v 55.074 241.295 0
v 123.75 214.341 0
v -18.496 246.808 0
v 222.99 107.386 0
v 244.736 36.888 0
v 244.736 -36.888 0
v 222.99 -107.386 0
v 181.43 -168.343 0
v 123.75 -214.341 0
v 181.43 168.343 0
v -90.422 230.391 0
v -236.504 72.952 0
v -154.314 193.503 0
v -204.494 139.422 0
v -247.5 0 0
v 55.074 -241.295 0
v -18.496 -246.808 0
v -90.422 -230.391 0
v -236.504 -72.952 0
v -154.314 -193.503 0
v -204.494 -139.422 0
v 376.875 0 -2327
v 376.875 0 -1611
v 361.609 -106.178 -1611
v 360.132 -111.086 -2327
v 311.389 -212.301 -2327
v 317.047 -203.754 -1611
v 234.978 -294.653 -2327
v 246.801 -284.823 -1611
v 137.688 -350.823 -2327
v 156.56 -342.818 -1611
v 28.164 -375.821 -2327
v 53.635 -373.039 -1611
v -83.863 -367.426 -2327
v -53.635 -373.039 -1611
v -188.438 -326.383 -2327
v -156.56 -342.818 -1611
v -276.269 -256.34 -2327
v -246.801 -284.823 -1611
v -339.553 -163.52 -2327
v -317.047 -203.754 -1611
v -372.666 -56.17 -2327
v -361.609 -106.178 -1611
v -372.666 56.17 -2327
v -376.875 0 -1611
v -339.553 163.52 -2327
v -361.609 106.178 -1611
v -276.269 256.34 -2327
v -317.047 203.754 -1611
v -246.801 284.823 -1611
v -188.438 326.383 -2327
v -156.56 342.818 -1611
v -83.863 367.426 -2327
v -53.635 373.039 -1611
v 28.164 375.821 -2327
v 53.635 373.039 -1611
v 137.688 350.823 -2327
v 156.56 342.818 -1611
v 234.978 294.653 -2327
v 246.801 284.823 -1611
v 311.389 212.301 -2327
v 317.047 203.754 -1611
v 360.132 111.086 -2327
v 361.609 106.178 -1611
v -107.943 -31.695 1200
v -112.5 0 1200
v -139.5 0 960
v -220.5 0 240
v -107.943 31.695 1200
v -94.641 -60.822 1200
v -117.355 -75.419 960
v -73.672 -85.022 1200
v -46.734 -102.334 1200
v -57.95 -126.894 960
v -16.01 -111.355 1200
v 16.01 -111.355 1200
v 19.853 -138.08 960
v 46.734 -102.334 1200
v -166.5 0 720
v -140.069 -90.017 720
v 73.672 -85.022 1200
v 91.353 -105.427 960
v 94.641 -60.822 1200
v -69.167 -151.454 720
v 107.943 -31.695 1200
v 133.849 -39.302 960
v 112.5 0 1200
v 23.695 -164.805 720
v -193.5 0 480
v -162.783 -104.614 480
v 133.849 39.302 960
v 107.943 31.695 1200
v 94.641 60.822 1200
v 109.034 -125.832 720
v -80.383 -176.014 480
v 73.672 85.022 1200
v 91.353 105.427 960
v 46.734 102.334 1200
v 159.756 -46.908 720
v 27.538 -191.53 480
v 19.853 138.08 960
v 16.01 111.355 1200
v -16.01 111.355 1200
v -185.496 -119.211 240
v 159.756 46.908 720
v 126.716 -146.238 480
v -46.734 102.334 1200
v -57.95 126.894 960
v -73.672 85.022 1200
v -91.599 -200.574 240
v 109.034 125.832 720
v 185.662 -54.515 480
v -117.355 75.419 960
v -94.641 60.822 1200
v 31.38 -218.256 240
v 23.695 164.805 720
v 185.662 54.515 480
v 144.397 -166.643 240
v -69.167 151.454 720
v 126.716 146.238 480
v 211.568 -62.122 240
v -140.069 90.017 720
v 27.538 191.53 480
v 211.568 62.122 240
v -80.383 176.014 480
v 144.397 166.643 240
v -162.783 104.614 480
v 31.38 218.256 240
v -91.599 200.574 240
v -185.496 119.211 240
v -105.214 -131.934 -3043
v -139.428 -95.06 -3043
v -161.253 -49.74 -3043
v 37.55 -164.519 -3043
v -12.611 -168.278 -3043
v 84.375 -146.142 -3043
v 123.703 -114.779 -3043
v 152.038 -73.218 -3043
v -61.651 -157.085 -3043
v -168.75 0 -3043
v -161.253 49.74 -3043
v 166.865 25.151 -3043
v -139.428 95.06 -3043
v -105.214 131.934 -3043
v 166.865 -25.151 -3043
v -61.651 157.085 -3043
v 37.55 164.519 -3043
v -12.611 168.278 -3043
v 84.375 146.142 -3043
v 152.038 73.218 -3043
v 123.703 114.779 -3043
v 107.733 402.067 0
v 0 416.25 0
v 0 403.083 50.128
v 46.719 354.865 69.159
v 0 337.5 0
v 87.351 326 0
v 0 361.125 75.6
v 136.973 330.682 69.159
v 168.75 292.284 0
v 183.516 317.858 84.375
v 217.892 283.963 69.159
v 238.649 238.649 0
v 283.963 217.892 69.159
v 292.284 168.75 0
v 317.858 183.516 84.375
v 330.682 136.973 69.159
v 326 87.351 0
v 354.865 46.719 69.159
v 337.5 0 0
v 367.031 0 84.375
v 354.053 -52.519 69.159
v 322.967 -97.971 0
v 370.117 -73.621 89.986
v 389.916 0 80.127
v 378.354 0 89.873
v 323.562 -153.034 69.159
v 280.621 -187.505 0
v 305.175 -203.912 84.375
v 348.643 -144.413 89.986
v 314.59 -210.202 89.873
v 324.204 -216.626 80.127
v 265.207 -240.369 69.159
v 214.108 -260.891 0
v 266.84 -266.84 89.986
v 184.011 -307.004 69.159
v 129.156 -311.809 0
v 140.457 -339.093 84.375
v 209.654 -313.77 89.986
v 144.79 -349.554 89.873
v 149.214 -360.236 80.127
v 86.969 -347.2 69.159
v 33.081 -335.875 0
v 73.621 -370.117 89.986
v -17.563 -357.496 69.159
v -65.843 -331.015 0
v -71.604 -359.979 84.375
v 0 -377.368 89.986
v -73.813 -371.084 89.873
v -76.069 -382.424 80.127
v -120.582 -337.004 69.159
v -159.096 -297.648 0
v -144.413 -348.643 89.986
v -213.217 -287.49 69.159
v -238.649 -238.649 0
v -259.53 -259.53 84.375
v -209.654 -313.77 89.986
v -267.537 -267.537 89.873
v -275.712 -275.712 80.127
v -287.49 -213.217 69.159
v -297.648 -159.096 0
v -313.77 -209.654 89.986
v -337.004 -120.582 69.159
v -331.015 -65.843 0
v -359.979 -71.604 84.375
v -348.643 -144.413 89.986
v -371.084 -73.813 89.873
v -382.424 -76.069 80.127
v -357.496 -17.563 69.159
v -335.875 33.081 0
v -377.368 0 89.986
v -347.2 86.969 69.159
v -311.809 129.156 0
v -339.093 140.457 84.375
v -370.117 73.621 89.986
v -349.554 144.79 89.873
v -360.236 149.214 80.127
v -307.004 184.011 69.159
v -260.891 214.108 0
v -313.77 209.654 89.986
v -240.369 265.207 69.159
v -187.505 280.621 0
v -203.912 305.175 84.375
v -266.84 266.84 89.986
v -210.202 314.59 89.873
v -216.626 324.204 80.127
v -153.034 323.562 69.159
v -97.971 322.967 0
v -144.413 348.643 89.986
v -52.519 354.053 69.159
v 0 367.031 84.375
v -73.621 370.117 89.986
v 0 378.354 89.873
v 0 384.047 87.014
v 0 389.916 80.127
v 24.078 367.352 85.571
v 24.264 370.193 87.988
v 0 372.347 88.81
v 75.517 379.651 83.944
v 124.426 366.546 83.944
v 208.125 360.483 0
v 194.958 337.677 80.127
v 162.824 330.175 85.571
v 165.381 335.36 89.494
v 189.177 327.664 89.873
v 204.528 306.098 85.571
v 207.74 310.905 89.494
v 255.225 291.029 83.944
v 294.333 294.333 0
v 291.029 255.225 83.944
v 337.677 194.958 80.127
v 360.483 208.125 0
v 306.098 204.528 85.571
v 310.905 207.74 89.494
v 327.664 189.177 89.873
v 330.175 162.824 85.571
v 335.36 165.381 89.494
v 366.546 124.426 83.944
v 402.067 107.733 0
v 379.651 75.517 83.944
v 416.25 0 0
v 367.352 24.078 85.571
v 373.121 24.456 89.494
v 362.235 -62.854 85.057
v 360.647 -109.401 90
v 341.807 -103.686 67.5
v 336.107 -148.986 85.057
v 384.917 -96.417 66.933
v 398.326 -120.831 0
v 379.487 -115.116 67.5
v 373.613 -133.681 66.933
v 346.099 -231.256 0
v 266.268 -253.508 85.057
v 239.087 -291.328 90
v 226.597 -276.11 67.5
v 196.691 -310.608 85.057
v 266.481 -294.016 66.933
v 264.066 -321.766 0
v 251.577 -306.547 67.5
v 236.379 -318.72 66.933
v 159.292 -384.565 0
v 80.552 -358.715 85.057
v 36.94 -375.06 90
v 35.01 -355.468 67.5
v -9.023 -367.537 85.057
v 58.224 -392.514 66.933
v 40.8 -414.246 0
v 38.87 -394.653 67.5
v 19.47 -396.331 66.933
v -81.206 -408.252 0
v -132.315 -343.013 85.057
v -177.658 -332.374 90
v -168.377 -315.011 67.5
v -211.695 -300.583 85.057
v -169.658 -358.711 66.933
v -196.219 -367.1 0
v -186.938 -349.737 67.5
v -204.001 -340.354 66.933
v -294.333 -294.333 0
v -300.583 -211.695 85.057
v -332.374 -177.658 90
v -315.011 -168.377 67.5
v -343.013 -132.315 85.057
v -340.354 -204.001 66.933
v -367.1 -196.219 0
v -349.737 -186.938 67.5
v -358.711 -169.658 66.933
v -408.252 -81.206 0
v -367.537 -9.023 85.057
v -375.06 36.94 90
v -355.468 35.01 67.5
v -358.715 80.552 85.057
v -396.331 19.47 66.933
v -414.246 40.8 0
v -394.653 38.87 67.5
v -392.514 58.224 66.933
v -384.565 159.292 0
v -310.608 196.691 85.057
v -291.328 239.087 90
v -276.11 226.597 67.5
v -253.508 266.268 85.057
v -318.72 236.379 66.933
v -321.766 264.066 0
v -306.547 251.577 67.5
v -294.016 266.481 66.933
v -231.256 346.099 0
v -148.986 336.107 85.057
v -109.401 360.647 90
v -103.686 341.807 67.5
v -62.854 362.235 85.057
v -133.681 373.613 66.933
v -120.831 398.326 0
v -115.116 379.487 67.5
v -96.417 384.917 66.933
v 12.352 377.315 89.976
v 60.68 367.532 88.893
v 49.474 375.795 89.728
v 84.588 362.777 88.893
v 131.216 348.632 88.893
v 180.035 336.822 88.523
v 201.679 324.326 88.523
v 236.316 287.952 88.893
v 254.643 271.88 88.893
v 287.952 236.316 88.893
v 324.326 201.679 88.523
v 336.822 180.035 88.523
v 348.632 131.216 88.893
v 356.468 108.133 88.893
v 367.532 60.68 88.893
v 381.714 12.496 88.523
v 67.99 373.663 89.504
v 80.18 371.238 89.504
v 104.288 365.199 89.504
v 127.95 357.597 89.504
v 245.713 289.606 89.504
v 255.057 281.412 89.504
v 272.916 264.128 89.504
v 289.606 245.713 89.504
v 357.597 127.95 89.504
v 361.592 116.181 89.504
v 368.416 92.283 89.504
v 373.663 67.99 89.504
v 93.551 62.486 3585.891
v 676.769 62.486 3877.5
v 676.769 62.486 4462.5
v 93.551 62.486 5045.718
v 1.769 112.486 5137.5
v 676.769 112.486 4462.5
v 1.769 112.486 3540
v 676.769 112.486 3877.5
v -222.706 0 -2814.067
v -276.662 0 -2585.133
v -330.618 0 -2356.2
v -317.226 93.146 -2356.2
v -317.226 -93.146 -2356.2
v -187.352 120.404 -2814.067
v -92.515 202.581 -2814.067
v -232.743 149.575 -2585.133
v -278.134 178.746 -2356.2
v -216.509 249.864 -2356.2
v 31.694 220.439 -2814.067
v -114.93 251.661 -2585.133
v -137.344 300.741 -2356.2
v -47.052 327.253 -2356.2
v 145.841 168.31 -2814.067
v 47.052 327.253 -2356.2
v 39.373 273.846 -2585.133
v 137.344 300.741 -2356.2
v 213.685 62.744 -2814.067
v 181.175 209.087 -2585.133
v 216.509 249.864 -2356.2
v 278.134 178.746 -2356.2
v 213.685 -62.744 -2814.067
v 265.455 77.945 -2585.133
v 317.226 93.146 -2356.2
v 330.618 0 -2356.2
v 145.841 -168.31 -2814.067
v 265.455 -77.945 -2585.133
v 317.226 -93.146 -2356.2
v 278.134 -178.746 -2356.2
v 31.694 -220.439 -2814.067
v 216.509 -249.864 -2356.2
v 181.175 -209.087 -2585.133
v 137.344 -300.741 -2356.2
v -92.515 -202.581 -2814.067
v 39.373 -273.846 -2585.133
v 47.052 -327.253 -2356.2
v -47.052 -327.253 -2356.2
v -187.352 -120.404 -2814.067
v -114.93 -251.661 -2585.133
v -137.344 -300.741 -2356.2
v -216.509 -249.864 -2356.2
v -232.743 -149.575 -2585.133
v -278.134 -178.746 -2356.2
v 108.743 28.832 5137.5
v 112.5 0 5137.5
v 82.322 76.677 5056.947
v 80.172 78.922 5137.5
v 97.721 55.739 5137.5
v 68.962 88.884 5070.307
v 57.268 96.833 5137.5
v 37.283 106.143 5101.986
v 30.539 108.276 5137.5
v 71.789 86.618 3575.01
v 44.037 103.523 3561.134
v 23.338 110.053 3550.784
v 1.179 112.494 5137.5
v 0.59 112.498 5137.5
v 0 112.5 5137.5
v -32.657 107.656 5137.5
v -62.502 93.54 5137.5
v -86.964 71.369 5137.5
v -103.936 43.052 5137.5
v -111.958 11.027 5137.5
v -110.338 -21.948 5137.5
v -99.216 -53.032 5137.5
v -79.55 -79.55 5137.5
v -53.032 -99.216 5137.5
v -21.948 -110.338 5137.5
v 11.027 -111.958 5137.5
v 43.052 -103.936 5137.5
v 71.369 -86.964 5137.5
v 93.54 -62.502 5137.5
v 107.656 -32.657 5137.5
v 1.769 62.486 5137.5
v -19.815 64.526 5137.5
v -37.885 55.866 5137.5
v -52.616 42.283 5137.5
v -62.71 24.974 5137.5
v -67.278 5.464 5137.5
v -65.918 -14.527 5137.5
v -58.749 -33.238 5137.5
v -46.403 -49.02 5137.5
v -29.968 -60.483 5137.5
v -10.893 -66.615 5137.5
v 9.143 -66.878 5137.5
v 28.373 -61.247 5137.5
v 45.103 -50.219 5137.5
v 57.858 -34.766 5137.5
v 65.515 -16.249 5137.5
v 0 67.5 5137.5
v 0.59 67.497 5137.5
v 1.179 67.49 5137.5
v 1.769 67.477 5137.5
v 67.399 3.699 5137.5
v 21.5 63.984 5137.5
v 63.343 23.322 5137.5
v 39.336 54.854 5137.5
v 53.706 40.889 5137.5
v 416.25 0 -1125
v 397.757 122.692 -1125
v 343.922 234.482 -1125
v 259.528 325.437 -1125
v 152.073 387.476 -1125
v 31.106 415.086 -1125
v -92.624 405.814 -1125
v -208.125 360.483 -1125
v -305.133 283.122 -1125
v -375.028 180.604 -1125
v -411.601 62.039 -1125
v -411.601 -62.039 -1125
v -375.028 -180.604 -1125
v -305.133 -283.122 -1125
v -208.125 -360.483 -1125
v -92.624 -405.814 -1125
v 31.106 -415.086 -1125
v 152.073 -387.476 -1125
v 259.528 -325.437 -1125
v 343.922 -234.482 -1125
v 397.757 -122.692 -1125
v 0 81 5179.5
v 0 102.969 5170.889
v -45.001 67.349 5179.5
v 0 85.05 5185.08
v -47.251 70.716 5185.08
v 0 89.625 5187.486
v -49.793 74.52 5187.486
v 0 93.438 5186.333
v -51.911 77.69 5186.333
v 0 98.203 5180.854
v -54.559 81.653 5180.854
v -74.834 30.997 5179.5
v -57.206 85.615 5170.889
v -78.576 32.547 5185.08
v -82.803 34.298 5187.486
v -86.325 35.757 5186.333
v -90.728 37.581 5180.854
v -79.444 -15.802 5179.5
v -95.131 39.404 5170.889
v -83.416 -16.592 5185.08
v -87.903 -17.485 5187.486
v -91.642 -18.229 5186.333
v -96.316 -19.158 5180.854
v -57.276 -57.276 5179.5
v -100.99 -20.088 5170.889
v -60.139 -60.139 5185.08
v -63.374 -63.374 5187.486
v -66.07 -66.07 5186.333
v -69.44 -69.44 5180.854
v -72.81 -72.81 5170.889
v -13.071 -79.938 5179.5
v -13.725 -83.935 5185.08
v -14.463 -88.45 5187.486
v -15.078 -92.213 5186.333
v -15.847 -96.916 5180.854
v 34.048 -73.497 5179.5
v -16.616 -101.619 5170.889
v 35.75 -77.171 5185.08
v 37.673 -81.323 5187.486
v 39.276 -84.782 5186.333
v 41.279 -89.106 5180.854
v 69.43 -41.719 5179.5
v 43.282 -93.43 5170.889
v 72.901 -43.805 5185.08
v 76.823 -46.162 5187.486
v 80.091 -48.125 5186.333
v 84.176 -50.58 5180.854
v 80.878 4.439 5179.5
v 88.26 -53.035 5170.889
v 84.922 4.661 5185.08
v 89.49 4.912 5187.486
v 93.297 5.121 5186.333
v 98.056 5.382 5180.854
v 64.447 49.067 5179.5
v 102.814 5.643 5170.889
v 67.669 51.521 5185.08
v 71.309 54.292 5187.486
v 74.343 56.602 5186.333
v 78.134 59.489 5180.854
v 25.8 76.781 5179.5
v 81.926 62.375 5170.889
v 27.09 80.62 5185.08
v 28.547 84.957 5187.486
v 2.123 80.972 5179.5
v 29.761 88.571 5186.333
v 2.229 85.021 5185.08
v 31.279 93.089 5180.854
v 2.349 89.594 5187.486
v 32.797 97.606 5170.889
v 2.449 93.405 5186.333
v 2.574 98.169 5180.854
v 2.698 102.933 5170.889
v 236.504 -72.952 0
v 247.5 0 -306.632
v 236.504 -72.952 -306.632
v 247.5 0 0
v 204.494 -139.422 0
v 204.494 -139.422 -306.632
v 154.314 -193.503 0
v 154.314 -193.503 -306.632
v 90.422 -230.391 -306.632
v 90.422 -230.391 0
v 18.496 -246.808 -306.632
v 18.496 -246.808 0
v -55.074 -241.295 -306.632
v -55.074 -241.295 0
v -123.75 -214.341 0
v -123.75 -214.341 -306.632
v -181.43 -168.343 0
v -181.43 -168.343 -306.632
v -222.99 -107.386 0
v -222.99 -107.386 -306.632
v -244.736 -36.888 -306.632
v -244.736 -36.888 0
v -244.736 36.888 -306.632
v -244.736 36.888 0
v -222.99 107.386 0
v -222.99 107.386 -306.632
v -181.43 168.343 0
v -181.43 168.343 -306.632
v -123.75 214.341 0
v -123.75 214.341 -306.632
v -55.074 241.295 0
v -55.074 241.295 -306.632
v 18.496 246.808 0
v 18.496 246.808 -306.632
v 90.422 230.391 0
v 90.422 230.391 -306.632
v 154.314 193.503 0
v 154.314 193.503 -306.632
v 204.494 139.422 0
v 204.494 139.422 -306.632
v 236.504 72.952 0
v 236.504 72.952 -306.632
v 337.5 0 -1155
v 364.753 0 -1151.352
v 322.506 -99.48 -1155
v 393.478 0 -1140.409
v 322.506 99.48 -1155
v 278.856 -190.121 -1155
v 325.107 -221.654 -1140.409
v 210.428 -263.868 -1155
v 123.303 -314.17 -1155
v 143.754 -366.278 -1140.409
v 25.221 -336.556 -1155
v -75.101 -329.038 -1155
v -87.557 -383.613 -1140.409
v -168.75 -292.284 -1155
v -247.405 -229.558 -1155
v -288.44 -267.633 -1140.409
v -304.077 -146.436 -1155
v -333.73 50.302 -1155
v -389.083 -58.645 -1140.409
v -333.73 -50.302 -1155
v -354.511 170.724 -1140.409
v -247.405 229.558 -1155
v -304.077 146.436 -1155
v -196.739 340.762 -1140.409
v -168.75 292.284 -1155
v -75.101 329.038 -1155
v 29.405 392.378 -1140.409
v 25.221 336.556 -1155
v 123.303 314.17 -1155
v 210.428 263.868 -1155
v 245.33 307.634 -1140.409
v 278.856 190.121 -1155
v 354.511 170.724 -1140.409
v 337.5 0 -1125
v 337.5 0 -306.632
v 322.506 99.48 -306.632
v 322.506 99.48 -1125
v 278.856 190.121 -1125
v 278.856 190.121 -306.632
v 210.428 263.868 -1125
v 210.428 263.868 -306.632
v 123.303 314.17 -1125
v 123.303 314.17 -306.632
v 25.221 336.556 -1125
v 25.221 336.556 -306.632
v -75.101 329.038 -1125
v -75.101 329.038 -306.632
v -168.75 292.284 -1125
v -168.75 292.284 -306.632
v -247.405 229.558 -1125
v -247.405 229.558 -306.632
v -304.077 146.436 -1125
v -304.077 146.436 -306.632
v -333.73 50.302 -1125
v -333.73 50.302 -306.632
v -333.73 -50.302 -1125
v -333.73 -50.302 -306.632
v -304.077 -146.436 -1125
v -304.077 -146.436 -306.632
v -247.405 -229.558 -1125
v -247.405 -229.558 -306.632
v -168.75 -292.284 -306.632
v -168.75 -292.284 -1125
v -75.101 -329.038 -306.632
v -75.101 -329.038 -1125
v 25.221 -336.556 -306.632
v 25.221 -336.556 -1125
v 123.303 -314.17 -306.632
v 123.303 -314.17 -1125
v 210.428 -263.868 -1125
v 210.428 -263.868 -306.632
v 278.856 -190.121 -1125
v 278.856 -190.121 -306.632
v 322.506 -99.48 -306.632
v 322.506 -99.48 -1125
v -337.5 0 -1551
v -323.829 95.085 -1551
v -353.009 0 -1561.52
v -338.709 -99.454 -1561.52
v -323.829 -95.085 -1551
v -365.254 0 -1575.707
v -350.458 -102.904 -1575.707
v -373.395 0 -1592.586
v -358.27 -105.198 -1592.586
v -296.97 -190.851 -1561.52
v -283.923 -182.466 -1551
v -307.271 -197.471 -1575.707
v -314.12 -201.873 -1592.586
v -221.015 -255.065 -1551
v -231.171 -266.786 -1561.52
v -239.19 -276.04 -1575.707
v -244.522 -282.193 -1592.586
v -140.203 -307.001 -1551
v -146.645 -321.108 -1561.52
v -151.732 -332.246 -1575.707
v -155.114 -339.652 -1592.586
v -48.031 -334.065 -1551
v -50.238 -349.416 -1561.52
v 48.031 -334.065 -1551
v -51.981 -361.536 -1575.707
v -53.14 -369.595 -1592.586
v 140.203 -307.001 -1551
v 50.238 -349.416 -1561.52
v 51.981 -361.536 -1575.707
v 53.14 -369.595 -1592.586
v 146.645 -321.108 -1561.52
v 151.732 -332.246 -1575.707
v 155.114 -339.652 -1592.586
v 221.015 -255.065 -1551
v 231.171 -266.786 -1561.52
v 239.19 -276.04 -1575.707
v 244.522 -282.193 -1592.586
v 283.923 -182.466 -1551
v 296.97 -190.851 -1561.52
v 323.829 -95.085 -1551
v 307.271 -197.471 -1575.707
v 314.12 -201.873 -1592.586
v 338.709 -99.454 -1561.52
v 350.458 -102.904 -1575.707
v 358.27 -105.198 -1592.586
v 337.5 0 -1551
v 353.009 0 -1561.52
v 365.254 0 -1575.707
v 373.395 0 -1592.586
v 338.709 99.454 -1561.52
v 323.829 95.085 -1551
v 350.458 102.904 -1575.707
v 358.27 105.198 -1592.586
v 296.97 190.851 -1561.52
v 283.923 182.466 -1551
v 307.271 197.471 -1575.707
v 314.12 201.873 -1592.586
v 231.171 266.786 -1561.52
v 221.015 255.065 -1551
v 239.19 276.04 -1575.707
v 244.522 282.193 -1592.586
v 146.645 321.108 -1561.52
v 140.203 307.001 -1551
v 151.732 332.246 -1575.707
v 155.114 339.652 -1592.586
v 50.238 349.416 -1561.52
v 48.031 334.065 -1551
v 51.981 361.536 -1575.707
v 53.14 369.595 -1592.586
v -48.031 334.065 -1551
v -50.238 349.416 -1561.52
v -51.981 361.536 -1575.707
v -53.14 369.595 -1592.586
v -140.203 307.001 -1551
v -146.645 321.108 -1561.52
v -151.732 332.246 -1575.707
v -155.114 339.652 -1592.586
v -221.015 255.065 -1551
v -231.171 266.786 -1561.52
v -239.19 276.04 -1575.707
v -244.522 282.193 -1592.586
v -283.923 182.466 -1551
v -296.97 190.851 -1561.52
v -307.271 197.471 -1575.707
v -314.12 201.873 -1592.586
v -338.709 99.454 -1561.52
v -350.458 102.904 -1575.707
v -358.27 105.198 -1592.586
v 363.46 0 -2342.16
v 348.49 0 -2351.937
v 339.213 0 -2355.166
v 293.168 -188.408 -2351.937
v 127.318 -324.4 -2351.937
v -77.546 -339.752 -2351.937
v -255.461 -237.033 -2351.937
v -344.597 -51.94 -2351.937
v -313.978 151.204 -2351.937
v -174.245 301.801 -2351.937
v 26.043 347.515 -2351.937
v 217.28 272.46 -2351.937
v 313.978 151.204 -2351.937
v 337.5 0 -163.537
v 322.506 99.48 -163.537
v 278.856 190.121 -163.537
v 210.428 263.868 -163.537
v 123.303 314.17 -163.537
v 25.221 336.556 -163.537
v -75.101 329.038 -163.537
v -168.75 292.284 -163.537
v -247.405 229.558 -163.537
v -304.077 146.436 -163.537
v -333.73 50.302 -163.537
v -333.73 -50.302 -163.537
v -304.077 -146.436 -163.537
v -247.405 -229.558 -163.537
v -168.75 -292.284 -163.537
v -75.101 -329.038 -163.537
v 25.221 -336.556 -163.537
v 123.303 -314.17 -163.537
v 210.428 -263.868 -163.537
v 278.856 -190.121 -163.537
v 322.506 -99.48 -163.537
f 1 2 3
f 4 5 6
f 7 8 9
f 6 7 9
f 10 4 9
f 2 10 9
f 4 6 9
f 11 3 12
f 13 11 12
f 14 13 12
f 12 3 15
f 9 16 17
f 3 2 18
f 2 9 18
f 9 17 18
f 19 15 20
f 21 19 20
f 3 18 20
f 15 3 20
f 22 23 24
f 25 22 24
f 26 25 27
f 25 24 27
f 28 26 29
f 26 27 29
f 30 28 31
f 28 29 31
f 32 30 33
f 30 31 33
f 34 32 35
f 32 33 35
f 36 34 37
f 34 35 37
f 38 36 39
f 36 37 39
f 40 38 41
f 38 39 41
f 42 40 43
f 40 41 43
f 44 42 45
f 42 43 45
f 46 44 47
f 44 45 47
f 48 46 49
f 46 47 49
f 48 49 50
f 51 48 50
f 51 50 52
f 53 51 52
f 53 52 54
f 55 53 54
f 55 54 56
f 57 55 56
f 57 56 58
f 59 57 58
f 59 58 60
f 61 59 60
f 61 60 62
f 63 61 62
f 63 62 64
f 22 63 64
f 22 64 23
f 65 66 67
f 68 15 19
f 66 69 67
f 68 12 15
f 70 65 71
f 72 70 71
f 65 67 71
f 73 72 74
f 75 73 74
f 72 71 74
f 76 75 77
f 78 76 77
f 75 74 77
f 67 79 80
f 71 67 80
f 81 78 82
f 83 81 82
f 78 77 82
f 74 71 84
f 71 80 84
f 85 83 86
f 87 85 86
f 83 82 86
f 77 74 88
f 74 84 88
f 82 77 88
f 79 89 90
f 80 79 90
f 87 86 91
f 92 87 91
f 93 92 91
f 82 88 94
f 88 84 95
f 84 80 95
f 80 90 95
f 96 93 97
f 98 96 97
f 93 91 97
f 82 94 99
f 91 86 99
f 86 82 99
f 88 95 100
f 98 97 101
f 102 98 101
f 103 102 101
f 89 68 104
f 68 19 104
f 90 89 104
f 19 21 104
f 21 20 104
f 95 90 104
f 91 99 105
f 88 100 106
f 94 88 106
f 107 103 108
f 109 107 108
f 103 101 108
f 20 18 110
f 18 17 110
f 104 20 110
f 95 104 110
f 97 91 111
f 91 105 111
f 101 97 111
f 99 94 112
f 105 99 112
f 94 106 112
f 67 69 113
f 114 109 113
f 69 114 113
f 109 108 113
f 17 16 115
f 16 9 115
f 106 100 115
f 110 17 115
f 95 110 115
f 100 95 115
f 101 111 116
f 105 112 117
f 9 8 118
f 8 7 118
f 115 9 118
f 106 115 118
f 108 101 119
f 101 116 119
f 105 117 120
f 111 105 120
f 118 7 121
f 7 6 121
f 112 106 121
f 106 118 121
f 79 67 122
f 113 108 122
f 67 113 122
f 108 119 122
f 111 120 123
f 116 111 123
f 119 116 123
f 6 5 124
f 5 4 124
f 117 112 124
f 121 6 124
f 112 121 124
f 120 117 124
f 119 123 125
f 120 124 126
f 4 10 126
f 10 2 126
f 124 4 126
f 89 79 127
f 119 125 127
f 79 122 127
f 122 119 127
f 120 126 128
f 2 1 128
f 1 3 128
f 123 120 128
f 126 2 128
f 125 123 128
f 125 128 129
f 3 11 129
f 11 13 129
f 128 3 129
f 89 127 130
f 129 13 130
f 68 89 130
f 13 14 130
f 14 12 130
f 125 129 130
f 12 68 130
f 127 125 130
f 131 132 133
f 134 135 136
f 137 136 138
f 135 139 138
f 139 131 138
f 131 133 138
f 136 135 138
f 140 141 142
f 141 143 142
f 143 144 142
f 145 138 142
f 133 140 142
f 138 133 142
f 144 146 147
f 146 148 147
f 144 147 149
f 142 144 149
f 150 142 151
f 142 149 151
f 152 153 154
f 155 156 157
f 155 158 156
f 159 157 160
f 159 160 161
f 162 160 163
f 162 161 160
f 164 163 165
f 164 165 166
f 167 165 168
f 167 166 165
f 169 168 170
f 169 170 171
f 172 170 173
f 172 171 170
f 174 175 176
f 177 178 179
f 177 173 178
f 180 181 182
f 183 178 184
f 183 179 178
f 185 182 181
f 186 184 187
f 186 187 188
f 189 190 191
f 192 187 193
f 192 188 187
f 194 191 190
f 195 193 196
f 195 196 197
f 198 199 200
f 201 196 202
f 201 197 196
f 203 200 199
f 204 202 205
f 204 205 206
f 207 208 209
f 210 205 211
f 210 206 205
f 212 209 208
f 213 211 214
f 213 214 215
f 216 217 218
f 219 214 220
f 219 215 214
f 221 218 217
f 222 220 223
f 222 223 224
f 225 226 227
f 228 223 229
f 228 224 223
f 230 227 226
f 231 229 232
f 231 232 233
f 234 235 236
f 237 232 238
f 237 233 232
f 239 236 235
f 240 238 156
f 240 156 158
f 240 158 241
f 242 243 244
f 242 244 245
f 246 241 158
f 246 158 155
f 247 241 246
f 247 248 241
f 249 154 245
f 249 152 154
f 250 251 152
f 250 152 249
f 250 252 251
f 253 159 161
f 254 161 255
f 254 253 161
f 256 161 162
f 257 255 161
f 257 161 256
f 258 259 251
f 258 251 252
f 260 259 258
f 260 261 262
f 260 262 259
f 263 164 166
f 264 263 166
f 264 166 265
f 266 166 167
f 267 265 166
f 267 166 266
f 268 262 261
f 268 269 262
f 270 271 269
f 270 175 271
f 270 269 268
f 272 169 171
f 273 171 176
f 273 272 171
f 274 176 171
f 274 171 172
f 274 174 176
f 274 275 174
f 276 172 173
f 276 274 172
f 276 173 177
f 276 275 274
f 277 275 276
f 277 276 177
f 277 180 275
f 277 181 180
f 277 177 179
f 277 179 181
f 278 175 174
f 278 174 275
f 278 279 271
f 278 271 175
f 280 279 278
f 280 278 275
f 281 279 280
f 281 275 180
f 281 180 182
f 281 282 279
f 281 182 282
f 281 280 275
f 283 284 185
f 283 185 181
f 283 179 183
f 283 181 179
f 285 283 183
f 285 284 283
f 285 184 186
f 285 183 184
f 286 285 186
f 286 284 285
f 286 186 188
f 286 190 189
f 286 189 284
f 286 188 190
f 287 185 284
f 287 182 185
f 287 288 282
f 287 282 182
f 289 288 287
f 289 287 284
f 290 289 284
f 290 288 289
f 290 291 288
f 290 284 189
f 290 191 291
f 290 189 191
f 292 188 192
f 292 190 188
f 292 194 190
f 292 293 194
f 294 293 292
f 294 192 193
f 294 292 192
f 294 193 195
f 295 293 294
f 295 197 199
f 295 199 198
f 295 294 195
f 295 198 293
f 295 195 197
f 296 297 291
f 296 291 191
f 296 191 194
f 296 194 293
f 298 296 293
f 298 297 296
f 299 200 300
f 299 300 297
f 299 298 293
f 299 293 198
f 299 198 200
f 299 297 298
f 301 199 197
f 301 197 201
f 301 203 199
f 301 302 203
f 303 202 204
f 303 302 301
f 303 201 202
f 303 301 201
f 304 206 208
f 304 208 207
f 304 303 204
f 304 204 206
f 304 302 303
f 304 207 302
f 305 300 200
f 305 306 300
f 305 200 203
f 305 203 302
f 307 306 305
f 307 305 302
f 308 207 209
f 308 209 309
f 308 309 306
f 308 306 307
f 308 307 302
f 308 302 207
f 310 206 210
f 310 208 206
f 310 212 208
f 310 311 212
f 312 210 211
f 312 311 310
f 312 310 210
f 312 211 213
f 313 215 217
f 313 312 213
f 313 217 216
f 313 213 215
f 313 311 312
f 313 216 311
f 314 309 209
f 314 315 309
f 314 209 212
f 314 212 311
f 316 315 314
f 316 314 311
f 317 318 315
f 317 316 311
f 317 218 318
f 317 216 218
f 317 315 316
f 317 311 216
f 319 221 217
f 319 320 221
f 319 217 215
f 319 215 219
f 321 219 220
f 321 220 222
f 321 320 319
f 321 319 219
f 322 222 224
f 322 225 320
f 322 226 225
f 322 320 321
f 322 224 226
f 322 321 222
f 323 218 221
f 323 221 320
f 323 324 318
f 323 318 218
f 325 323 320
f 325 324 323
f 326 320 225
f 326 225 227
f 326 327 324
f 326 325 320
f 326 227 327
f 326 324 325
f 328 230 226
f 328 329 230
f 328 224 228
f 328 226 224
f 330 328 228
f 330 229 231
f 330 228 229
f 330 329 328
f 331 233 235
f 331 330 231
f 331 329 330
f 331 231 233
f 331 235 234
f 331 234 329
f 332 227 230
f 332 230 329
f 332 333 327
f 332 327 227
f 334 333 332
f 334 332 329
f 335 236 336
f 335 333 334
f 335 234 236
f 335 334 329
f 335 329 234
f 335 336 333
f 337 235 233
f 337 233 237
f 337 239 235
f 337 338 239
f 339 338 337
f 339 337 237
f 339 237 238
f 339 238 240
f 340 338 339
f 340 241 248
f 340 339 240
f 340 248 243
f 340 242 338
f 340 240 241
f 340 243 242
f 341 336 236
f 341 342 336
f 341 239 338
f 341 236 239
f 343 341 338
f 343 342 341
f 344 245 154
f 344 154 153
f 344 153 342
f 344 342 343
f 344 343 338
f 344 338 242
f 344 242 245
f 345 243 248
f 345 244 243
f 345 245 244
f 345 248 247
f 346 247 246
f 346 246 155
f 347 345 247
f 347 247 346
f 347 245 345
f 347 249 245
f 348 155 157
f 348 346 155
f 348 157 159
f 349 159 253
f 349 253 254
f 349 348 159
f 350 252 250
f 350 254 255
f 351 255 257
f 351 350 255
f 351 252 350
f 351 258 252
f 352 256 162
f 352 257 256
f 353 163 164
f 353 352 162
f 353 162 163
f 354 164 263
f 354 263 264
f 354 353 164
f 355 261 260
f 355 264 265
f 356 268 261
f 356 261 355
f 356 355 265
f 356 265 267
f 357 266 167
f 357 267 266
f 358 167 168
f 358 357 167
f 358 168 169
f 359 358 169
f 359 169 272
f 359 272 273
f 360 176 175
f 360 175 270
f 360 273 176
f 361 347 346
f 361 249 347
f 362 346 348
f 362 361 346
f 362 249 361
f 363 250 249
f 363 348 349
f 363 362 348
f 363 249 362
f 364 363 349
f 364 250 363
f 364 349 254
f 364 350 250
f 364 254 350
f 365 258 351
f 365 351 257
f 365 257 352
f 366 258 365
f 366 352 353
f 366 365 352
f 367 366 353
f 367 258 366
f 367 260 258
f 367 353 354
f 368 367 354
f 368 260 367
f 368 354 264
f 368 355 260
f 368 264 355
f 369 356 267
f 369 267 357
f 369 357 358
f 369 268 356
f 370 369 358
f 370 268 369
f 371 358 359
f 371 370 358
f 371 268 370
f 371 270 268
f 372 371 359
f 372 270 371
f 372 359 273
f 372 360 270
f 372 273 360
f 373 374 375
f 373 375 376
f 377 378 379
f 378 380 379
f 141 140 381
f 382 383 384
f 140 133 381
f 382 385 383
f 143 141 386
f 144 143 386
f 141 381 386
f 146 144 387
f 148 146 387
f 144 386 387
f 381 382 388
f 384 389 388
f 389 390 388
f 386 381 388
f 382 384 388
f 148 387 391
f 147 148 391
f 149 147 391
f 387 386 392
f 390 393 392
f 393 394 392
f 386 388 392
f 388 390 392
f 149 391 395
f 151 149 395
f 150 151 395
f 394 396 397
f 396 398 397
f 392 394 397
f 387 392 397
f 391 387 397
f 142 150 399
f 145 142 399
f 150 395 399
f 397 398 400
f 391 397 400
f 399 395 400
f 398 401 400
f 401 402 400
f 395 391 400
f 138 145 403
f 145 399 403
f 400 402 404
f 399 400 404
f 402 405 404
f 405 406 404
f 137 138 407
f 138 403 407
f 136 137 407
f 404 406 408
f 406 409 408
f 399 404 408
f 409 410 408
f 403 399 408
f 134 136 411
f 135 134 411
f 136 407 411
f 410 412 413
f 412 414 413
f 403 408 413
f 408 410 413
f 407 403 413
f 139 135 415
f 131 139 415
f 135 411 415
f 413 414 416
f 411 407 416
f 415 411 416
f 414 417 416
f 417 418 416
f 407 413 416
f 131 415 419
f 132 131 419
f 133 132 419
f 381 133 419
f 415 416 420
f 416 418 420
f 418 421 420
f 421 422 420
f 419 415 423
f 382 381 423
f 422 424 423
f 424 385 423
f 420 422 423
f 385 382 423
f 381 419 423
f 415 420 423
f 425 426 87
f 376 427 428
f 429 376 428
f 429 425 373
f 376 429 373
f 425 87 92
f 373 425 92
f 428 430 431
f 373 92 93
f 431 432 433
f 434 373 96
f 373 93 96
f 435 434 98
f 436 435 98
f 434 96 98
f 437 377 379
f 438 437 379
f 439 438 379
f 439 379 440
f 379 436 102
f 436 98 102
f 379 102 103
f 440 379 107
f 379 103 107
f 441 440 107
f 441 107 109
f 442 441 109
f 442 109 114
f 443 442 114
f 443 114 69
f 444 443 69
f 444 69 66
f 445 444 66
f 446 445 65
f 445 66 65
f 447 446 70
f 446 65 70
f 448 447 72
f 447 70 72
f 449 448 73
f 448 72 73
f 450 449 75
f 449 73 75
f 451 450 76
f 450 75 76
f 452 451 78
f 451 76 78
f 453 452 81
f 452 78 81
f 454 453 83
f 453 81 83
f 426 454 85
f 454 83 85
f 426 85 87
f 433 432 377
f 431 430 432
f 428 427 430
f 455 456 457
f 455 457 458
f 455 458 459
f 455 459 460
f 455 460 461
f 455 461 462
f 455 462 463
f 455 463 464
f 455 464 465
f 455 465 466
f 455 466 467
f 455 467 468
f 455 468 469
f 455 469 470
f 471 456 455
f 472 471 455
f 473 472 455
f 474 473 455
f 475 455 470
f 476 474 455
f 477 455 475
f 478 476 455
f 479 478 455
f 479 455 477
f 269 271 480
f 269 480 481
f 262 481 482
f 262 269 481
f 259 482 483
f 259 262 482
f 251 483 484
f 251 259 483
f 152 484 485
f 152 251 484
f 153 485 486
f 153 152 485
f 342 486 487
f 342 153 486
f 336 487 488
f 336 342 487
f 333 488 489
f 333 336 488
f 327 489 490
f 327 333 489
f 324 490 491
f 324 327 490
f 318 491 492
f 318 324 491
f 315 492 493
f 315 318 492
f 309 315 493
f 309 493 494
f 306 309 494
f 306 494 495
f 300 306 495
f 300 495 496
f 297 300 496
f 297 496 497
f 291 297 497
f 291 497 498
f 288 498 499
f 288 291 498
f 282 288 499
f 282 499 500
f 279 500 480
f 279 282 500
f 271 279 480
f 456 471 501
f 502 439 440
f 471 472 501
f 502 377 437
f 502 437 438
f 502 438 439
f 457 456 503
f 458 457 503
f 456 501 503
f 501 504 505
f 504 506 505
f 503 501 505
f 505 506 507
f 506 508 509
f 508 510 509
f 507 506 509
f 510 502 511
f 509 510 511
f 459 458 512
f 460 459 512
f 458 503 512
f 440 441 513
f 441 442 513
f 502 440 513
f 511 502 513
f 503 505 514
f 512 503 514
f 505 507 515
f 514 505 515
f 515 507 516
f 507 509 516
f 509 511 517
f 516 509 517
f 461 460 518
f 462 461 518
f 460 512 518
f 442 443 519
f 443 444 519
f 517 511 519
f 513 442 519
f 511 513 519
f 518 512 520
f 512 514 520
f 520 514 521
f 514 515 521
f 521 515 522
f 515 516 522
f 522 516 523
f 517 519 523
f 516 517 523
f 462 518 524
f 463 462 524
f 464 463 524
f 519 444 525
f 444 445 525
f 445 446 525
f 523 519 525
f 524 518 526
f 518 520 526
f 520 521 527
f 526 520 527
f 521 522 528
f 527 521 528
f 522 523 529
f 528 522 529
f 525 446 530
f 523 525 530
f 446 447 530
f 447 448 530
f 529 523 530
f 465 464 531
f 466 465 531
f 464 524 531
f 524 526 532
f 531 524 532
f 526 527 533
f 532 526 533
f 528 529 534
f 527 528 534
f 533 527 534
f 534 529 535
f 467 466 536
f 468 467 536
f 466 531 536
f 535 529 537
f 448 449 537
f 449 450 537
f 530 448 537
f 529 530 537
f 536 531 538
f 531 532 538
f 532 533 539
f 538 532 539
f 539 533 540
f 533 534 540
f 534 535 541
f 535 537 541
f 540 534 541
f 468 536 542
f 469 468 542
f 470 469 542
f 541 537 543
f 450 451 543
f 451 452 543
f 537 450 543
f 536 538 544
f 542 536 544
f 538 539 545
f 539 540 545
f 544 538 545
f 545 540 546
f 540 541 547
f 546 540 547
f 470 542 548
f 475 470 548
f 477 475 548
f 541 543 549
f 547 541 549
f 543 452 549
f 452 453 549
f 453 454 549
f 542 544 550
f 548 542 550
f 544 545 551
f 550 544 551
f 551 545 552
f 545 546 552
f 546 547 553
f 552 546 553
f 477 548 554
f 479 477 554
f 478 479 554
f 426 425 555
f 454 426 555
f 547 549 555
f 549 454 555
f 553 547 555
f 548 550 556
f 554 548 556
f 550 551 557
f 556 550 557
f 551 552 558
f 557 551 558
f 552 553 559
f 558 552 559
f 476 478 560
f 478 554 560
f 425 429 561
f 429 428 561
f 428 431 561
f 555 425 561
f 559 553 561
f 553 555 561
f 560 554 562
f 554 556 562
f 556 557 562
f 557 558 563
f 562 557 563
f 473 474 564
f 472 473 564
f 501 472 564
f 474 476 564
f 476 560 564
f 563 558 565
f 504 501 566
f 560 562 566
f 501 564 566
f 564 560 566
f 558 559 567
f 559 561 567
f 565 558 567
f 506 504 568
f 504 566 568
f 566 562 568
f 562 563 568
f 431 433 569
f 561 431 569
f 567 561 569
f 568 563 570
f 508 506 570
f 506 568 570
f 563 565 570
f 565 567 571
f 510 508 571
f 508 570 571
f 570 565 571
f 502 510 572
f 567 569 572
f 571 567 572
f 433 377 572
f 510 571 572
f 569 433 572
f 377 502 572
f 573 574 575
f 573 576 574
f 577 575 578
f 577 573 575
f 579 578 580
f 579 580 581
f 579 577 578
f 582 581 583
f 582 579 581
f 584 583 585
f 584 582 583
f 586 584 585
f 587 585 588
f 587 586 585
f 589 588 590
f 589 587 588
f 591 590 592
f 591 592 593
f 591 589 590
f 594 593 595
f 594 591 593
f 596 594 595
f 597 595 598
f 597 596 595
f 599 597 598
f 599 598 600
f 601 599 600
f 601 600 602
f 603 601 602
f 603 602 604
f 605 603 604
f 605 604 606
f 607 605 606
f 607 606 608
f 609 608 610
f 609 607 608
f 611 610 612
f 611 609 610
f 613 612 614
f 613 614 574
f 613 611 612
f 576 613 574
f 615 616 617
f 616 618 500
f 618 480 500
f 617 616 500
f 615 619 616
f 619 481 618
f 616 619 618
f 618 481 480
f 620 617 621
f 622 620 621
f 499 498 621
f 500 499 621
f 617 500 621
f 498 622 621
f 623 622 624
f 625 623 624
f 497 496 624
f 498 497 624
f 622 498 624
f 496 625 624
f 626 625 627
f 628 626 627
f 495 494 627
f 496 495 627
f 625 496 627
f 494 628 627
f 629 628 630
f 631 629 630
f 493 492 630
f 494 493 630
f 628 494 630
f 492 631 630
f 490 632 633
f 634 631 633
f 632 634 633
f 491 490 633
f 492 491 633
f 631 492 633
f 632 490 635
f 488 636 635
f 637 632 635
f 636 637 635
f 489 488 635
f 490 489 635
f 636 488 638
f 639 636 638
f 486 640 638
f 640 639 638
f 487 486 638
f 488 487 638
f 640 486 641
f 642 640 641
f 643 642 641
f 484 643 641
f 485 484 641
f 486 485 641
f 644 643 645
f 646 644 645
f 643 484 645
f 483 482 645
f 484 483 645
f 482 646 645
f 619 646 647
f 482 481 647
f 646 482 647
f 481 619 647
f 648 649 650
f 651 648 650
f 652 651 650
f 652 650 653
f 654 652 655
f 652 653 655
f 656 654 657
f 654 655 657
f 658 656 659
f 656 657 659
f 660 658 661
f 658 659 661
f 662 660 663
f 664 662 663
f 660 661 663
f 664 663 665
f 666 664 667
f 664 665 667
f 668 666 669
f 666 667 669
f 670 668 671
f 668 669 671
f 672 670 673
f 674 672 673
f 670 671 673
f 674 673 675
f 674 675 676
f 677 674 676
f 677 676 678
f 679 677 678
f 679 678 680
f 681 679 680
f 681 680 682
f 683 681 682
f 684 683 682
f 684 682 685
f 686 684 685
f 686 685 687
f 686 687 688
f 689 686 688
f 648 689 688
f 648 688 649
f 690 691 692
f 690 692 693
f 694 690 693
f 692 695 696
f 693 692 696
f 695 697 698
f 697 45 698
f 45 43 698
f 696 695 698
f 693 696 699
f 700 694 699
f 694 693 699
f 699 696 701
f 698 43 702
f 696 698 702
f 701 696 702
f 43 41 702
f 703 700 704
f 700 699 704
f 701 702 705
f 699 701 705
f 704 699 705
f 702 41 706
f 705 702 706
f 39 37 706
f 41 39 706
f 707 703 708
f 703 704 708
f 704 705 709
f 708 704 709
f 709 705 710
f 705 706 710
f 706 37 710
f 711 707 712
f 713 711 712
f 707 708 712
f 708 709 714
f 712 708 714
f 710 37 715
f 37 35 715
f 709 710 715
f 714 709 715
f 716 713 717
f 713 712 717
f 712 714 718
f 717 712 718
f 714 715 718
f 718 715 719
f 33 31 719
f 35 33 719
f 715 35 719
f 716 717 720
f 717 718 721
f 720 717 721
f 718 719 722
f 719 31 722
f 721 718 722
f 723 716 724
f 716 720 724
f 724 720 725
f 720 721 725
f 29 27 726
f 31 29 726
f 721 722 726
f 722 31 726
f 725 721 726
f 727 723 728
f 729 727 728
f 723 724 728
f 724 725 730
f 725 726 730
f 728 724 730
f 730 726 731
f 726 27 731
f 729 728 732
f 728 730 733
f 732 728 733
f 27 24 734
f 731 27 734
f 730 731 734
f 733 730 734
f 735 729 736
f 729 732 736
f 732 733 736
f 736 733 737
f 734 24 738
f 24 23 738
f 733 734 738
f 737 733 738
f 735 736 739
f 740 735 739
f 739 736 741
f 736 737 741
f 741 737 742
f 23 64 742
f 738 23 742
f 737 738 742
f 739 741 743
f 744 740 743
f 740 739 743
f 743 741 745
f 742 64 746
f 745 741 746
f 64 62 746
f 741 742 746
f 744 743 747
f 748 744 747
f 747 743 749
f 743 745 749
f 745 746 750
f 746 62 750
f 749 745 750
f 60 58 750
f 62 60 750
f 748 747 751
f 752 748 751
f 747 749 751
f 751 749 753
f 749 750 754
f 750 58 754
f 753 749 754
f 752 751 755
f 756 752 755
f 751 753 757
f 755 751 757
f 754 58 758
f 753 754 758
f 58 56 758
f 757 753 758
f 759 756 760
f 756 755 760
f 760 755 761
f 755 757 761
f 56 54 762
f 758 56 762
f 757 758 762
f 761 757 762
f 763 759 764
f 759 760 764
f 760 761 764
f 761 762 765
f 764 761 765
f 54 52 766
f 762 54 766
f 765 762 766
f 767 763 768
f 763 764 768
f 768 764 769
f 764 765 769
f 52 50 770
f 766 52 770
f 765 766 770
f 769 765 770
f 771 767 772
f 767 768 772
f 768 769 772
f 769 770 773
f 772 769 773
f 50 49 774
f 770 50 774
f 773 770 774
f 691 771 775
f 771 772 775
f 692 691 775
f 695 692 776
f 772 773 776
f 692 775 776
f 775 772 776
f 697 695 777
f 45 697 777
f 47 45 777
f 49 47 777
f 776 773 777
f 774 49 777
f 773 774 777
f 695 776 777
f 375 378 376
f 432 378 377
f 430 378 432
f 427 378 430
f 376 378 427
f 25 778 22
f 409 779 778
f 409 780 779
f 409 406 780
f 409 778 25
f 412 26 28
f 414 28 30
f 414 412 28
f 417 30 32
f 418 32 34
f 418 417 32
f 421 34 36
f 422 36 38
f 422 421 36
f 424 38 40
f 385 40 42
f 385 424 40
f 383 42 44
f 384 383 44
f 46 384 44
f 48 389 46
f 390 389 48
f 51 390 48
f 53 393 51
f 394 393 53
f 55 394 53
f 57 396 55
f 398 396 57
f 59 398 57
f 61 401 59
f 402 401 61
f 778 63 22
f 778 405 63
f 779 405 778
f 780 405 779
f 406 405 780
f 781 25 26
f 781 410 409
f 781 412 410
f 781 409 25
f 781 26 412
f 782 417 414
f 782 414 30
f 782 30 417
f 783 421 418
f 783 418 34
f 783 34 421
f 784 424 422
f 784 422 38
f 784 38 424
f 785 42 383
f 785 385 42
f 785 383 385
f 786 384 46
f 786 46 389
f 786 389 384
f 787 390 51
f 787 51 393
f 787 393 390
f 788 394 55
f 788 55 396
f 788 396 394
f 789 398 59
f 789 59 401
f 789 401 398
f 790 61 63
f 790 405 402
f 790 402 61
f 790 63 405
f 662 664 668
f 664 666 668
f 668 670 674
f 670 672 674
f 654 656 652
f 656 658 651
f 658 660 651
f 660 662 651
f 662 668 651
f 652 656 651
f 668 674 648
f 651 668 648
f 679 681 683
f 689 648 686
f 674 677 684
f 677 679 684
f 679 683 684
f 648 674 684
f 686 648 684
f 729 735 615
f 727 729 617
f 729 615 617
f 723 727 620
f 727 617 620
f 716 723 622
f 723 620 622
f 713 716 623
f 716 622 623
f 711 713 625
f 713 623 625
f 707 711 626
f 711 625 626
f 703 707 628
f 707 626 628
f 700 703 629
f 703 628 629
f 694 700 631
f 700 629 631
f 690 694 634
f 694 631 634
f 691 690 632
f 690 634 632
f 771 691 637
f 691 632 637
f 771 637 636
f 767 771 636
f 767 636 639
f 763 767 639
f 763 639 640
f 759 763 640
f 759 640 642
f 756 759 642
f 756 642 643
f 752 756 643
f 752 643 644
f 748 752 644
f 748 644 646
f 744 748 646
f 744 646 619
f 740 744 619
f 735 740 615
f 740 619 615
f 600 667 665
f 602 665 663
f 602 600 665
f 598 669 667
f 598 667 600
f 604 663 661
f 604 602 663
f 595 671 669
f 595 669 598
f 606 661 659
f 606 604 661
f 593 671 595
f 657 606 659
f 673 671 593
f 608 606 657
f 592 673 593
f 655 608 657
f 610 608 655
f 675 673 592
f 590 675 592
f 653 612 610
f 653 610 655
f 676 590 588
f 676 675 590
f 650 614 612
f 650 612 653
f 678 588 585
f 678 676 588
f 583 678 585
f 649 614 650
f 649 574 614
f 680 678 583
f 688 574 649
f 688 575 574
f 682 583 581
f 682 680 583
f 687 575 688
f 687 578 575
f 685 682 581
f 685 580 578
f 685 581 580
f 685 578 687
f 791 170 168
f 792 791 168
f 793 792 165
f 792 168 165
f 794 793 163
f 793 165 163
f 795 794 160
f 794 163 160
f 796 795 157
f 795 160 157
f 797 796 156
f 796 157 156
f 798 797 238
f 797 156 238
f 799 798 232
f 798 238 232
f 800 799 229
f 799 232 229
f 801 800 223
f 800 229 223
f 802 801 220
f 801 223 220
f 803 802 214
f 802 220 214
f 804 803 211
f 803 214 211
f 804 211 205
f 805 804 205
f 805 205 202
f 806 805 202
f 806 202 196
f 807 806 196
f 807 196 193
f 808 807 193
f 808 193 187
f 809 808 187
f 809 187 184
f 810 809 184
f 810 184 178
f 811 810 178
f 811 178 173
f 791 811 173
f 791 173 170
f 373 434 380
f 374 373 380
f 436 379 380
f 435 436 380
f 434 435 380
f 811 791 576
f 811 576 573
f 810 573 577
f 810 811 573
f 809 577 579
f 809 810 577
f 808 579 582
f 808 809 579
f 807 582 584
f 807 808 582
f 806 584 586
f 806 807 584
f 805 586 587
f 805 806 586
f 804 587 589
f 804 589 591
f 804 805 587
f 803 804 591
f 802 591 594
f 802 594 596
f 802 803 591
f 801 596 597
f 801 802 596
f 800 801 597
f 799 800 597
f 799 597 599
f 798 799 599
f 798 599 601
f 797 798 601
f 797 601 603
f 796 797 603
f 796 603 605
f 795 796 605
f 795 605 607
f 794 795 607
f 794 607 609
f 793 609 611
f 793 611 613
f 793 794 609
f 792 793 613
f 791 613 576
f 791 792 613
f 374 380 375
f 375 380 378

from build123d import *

# Parameters (mm, degrees)
SKETCH1_R           = 416.25
SKETCH1_R_2         = 337.5
BOSS_EXTRUDE1_DEPTH = 1125
SKETCH5_R           = 112.5
BOSS_EXTRUDE2_DEPTH = 3937.5
SKETCH15_R          = 337.5
BOSS_EXTRUDE5_DEPTH = 486
SKETCH16_R          = 376.875
BOSS_EXTRUDE6_DEPTH = 716
BOSS_EXTRUDE7_DEPTH = 50


with BuildPart() as part:
    # Sketch1 → Boss-Extrude1 (new body)
    with BuildSketch(Plane.XY):
        Circle(SKETCH1_R)
        Circle(SKETCH1_R_2, mode=Mode.SUBTRACT)
    extrude(amount=-BOSS_EXTRUDE1_DEPTH)

    # Sketch2 → Revolve1 (revolve)
    with BuildSketch(Plane(origin=(0, 0, 0), x_dir=(0, 0, -1), z_dir=(1, 0, 0))):
        with BuildLine():
            Line((0, 416.25), (0, 337.5))
            add(Edge.make_bspline(
                [(0, 337.5), (-180, 376.875), (0, 416.25)],
                knots=[0, 0, 0, 1, 1, 1], degree=2))
        make_face()
    revolve(axis=Axis((0, 0, 0), (0, 0, -1)))

    # Sketch18 → Revolve6 (revolve)
    with BuildSketch(Plane(origin=(0, 0, 0), x_dir=(0, 0, -1), z_dir=(1, 0, 0)), mode=Mode.PRIVATE) as revolve6_sk:
        Polygon((0, 247.5), (306.632414301, 416.25), (306.632414301, 247.5), align=None)
    revolve(revolve6_sk.sketch.rotate(Axis((0, 0, 0), (0, 0, -1)), 90), axis=Axis((0, 0, 0), (0, 0, -1)))



with BuildPart() as body_2:
    # Sketch4 → Revolve2 (revolve)
    with BuildSketch(Plane(origin=(0, 0, 0), x_dir=(1, 0, 0), z_dir=(0, 1, 0)), mode=Mode.PRIVATE) as revolve2_sk:
        Polygon((0, 0), (0, -1200), (112.5, -1200), (247.5, 0), align=None)
    revolve(revolve2_sk.sketch.rotate(Axis((0, 0, 0), (0, 0, 1)), 180), axis=Axis((0, 0, 0), (0, 0, 1)))

    # Sketch5 → Boss-Extrude2 (add)
    with BuildSketch(Plane.XY.offset(1200)):
        Circle(SKETCH5_R)
    extrude(amount=BOSS_EXTRUDE2_DEPTH)

    # Sketch14 → Revolve4 (revolve)
    with BuildSketch(Plane(origin=(0, 0, 0), x_dir=(0, 0, -1), z_dir=(1, 0, 0))):
        with BuildLine():
            add(Edge.make_bspline(
                [(-5137.5, 67.5), (-5237.5, 90), (-5137.5, 112.5)],
                knots=[0, 0, 0, 1, 1, 1], degree=2))
            Line((-5137.5, 112.5), (-5137.5, 67.5))
        make_face()
    revolve(axis=Axis((0, 0, 5137.5), (0, 0, 1)))

    # Sketch22 → Boss-Extrude7 (add)
    with BuildSketch(Plane(origin=(0, 112.486092048, 0), x_dir=(1, 0, 0), z_dir=(0, 1, 0))):
        Polygon((676.768925034, -4462.5), (1.768925034, -5137.5), (1.768925034, -3540), (676.768925034, -3877.5), align=None)
    extrude(amount=-BOSS_EXTRUDE7_DEPTH)


with BuildPart() as body_3:
    # Sketch15 → Boss-Extrude5 (new body)
    with BuildSketch(Plane(origin=(0, 0, -1125), x_dir=(-1, 0, 0), z_dir=(0, 0, -1))):
        with Locations(Location((0, 0, 0), (0, 0, 180))):
            Circle(SKETCH15_R)
    extrude(amount=BOSS_EXTRUDE5_DEPTH)

    # Sketch16 → Boss-Extrude6 (add)
    with BuildSketch(Plane(origin=(0, 0, -1611), x_dir=(-1, 0, 0), z_dir=(0, 0, -1))):
        with Locations(Location((0, 0, 0), (0, 0, 180))):
            Circle(SKETCH16_R)
    extrude(amount=BOSS_EXTRUDE6_DEPTH)

    # Sketch17 → Revolve5 (revolve)
    with BuildSketch(Plane(origin=(0, 0, 0), x_dir=(0, 0, -1), z_dir=(1, 0, 0)), mode=Mode.PRIVATE) as revolve5_sk:
        Polygon((2327, 0), (3043, 0), (3043, 168.75), (2327, 337.5), align=None)
    revolve(revolve5_sk.sketch.rotate(Axis((0, 0, -2327), (0, 0, -1)), 270), axis=Axis((0, 0, -2327), (0, 0, -1)))

    # Sketch19 → Revolve9 (revolve)
    with BuildSketch(Plane(origin=(0, 0, 0), x_dir=(0, 0, -1), z_dir=(1, 0, 0)), mode=Mode.PRIVATE) as revolve9_sk:
        with BuildLine():
            Line((1611, 337.5), (1551, 337.5))
            ThreePointArc((1551, 337.5), (1575.706535425, 365.253731733), (1611, 376.875))
            Line((1611, 376.875), (1611, 337.5))
        make_face()
    revolve(revolve9_sk.sketch.rotate(Axis((0, 0, -1611), (0, 0, 1)), 90), axis=Axis((0, 0, -1611), (0, 0, 1)))


with BuildPart() as part_1:
    add(part.part)

    add(body_3.part)  # Revolve11 merges body 3
    # Sketch20 → Revolve11 (revolve)
    with BuildSketch(Plane(origin=(0, 0, 0), x_dir=(0, 0, -1), z_dir=(1, 0, 0)), mode=Mode.PRIVATE) as revolve11_sk:
        with BuildLine():
            Line((1125, 337.5), (1125, 416.25))
            add(Edge.make_bspline(
                [(1155, 337.5), (1155, 382.589285714), (1125, 416.25)],
                knots=[0, 0, 0, 1, 1, 1], degree=2, weights=[1, 0.806097206, 1]))
            Line((1155, 337.5), (1125, 337.5))
        make_face()
    revolve(revolve11_sk.sketch.rotate(Axis((0, 0, -1125), (0, 0, -1)), 90), axis=Axis((0, 0, -1125), (0, 0, -1)))

    # Sketch21 → Revolve12 (revolve)
    with BuildSketch(Plane(origin=(0, 0, 0), x_dir=(0, 0, -1), z_dir=(1, 0, 0)), mode=Mode.PRIVATE) as revolve12_sk:
        with BuildLine():
            Line((2327, 337.5), (2327, 376.875))
            add(Edge.make_bspline(
                [(2327, 376.875), (2356.199972531, 357.1875), (2356.199972531, 330.618023234)],
                knots=[0, 0, 0, 1, 1, 1], degree=2, weights=[1, 0.829833158, 1]))
            Line((2356.199972531, 330.618023234), (2327, 337.5))
        make_face()
    revolve(revolve12_sk.sketch.rotate(Axis((0, 0, -2327), (0, 0, -1)), 90), axis=Axis((0, 0, -2327), (0, 0, -1)))


solid = Compound([body_2.part, part_1.part])
